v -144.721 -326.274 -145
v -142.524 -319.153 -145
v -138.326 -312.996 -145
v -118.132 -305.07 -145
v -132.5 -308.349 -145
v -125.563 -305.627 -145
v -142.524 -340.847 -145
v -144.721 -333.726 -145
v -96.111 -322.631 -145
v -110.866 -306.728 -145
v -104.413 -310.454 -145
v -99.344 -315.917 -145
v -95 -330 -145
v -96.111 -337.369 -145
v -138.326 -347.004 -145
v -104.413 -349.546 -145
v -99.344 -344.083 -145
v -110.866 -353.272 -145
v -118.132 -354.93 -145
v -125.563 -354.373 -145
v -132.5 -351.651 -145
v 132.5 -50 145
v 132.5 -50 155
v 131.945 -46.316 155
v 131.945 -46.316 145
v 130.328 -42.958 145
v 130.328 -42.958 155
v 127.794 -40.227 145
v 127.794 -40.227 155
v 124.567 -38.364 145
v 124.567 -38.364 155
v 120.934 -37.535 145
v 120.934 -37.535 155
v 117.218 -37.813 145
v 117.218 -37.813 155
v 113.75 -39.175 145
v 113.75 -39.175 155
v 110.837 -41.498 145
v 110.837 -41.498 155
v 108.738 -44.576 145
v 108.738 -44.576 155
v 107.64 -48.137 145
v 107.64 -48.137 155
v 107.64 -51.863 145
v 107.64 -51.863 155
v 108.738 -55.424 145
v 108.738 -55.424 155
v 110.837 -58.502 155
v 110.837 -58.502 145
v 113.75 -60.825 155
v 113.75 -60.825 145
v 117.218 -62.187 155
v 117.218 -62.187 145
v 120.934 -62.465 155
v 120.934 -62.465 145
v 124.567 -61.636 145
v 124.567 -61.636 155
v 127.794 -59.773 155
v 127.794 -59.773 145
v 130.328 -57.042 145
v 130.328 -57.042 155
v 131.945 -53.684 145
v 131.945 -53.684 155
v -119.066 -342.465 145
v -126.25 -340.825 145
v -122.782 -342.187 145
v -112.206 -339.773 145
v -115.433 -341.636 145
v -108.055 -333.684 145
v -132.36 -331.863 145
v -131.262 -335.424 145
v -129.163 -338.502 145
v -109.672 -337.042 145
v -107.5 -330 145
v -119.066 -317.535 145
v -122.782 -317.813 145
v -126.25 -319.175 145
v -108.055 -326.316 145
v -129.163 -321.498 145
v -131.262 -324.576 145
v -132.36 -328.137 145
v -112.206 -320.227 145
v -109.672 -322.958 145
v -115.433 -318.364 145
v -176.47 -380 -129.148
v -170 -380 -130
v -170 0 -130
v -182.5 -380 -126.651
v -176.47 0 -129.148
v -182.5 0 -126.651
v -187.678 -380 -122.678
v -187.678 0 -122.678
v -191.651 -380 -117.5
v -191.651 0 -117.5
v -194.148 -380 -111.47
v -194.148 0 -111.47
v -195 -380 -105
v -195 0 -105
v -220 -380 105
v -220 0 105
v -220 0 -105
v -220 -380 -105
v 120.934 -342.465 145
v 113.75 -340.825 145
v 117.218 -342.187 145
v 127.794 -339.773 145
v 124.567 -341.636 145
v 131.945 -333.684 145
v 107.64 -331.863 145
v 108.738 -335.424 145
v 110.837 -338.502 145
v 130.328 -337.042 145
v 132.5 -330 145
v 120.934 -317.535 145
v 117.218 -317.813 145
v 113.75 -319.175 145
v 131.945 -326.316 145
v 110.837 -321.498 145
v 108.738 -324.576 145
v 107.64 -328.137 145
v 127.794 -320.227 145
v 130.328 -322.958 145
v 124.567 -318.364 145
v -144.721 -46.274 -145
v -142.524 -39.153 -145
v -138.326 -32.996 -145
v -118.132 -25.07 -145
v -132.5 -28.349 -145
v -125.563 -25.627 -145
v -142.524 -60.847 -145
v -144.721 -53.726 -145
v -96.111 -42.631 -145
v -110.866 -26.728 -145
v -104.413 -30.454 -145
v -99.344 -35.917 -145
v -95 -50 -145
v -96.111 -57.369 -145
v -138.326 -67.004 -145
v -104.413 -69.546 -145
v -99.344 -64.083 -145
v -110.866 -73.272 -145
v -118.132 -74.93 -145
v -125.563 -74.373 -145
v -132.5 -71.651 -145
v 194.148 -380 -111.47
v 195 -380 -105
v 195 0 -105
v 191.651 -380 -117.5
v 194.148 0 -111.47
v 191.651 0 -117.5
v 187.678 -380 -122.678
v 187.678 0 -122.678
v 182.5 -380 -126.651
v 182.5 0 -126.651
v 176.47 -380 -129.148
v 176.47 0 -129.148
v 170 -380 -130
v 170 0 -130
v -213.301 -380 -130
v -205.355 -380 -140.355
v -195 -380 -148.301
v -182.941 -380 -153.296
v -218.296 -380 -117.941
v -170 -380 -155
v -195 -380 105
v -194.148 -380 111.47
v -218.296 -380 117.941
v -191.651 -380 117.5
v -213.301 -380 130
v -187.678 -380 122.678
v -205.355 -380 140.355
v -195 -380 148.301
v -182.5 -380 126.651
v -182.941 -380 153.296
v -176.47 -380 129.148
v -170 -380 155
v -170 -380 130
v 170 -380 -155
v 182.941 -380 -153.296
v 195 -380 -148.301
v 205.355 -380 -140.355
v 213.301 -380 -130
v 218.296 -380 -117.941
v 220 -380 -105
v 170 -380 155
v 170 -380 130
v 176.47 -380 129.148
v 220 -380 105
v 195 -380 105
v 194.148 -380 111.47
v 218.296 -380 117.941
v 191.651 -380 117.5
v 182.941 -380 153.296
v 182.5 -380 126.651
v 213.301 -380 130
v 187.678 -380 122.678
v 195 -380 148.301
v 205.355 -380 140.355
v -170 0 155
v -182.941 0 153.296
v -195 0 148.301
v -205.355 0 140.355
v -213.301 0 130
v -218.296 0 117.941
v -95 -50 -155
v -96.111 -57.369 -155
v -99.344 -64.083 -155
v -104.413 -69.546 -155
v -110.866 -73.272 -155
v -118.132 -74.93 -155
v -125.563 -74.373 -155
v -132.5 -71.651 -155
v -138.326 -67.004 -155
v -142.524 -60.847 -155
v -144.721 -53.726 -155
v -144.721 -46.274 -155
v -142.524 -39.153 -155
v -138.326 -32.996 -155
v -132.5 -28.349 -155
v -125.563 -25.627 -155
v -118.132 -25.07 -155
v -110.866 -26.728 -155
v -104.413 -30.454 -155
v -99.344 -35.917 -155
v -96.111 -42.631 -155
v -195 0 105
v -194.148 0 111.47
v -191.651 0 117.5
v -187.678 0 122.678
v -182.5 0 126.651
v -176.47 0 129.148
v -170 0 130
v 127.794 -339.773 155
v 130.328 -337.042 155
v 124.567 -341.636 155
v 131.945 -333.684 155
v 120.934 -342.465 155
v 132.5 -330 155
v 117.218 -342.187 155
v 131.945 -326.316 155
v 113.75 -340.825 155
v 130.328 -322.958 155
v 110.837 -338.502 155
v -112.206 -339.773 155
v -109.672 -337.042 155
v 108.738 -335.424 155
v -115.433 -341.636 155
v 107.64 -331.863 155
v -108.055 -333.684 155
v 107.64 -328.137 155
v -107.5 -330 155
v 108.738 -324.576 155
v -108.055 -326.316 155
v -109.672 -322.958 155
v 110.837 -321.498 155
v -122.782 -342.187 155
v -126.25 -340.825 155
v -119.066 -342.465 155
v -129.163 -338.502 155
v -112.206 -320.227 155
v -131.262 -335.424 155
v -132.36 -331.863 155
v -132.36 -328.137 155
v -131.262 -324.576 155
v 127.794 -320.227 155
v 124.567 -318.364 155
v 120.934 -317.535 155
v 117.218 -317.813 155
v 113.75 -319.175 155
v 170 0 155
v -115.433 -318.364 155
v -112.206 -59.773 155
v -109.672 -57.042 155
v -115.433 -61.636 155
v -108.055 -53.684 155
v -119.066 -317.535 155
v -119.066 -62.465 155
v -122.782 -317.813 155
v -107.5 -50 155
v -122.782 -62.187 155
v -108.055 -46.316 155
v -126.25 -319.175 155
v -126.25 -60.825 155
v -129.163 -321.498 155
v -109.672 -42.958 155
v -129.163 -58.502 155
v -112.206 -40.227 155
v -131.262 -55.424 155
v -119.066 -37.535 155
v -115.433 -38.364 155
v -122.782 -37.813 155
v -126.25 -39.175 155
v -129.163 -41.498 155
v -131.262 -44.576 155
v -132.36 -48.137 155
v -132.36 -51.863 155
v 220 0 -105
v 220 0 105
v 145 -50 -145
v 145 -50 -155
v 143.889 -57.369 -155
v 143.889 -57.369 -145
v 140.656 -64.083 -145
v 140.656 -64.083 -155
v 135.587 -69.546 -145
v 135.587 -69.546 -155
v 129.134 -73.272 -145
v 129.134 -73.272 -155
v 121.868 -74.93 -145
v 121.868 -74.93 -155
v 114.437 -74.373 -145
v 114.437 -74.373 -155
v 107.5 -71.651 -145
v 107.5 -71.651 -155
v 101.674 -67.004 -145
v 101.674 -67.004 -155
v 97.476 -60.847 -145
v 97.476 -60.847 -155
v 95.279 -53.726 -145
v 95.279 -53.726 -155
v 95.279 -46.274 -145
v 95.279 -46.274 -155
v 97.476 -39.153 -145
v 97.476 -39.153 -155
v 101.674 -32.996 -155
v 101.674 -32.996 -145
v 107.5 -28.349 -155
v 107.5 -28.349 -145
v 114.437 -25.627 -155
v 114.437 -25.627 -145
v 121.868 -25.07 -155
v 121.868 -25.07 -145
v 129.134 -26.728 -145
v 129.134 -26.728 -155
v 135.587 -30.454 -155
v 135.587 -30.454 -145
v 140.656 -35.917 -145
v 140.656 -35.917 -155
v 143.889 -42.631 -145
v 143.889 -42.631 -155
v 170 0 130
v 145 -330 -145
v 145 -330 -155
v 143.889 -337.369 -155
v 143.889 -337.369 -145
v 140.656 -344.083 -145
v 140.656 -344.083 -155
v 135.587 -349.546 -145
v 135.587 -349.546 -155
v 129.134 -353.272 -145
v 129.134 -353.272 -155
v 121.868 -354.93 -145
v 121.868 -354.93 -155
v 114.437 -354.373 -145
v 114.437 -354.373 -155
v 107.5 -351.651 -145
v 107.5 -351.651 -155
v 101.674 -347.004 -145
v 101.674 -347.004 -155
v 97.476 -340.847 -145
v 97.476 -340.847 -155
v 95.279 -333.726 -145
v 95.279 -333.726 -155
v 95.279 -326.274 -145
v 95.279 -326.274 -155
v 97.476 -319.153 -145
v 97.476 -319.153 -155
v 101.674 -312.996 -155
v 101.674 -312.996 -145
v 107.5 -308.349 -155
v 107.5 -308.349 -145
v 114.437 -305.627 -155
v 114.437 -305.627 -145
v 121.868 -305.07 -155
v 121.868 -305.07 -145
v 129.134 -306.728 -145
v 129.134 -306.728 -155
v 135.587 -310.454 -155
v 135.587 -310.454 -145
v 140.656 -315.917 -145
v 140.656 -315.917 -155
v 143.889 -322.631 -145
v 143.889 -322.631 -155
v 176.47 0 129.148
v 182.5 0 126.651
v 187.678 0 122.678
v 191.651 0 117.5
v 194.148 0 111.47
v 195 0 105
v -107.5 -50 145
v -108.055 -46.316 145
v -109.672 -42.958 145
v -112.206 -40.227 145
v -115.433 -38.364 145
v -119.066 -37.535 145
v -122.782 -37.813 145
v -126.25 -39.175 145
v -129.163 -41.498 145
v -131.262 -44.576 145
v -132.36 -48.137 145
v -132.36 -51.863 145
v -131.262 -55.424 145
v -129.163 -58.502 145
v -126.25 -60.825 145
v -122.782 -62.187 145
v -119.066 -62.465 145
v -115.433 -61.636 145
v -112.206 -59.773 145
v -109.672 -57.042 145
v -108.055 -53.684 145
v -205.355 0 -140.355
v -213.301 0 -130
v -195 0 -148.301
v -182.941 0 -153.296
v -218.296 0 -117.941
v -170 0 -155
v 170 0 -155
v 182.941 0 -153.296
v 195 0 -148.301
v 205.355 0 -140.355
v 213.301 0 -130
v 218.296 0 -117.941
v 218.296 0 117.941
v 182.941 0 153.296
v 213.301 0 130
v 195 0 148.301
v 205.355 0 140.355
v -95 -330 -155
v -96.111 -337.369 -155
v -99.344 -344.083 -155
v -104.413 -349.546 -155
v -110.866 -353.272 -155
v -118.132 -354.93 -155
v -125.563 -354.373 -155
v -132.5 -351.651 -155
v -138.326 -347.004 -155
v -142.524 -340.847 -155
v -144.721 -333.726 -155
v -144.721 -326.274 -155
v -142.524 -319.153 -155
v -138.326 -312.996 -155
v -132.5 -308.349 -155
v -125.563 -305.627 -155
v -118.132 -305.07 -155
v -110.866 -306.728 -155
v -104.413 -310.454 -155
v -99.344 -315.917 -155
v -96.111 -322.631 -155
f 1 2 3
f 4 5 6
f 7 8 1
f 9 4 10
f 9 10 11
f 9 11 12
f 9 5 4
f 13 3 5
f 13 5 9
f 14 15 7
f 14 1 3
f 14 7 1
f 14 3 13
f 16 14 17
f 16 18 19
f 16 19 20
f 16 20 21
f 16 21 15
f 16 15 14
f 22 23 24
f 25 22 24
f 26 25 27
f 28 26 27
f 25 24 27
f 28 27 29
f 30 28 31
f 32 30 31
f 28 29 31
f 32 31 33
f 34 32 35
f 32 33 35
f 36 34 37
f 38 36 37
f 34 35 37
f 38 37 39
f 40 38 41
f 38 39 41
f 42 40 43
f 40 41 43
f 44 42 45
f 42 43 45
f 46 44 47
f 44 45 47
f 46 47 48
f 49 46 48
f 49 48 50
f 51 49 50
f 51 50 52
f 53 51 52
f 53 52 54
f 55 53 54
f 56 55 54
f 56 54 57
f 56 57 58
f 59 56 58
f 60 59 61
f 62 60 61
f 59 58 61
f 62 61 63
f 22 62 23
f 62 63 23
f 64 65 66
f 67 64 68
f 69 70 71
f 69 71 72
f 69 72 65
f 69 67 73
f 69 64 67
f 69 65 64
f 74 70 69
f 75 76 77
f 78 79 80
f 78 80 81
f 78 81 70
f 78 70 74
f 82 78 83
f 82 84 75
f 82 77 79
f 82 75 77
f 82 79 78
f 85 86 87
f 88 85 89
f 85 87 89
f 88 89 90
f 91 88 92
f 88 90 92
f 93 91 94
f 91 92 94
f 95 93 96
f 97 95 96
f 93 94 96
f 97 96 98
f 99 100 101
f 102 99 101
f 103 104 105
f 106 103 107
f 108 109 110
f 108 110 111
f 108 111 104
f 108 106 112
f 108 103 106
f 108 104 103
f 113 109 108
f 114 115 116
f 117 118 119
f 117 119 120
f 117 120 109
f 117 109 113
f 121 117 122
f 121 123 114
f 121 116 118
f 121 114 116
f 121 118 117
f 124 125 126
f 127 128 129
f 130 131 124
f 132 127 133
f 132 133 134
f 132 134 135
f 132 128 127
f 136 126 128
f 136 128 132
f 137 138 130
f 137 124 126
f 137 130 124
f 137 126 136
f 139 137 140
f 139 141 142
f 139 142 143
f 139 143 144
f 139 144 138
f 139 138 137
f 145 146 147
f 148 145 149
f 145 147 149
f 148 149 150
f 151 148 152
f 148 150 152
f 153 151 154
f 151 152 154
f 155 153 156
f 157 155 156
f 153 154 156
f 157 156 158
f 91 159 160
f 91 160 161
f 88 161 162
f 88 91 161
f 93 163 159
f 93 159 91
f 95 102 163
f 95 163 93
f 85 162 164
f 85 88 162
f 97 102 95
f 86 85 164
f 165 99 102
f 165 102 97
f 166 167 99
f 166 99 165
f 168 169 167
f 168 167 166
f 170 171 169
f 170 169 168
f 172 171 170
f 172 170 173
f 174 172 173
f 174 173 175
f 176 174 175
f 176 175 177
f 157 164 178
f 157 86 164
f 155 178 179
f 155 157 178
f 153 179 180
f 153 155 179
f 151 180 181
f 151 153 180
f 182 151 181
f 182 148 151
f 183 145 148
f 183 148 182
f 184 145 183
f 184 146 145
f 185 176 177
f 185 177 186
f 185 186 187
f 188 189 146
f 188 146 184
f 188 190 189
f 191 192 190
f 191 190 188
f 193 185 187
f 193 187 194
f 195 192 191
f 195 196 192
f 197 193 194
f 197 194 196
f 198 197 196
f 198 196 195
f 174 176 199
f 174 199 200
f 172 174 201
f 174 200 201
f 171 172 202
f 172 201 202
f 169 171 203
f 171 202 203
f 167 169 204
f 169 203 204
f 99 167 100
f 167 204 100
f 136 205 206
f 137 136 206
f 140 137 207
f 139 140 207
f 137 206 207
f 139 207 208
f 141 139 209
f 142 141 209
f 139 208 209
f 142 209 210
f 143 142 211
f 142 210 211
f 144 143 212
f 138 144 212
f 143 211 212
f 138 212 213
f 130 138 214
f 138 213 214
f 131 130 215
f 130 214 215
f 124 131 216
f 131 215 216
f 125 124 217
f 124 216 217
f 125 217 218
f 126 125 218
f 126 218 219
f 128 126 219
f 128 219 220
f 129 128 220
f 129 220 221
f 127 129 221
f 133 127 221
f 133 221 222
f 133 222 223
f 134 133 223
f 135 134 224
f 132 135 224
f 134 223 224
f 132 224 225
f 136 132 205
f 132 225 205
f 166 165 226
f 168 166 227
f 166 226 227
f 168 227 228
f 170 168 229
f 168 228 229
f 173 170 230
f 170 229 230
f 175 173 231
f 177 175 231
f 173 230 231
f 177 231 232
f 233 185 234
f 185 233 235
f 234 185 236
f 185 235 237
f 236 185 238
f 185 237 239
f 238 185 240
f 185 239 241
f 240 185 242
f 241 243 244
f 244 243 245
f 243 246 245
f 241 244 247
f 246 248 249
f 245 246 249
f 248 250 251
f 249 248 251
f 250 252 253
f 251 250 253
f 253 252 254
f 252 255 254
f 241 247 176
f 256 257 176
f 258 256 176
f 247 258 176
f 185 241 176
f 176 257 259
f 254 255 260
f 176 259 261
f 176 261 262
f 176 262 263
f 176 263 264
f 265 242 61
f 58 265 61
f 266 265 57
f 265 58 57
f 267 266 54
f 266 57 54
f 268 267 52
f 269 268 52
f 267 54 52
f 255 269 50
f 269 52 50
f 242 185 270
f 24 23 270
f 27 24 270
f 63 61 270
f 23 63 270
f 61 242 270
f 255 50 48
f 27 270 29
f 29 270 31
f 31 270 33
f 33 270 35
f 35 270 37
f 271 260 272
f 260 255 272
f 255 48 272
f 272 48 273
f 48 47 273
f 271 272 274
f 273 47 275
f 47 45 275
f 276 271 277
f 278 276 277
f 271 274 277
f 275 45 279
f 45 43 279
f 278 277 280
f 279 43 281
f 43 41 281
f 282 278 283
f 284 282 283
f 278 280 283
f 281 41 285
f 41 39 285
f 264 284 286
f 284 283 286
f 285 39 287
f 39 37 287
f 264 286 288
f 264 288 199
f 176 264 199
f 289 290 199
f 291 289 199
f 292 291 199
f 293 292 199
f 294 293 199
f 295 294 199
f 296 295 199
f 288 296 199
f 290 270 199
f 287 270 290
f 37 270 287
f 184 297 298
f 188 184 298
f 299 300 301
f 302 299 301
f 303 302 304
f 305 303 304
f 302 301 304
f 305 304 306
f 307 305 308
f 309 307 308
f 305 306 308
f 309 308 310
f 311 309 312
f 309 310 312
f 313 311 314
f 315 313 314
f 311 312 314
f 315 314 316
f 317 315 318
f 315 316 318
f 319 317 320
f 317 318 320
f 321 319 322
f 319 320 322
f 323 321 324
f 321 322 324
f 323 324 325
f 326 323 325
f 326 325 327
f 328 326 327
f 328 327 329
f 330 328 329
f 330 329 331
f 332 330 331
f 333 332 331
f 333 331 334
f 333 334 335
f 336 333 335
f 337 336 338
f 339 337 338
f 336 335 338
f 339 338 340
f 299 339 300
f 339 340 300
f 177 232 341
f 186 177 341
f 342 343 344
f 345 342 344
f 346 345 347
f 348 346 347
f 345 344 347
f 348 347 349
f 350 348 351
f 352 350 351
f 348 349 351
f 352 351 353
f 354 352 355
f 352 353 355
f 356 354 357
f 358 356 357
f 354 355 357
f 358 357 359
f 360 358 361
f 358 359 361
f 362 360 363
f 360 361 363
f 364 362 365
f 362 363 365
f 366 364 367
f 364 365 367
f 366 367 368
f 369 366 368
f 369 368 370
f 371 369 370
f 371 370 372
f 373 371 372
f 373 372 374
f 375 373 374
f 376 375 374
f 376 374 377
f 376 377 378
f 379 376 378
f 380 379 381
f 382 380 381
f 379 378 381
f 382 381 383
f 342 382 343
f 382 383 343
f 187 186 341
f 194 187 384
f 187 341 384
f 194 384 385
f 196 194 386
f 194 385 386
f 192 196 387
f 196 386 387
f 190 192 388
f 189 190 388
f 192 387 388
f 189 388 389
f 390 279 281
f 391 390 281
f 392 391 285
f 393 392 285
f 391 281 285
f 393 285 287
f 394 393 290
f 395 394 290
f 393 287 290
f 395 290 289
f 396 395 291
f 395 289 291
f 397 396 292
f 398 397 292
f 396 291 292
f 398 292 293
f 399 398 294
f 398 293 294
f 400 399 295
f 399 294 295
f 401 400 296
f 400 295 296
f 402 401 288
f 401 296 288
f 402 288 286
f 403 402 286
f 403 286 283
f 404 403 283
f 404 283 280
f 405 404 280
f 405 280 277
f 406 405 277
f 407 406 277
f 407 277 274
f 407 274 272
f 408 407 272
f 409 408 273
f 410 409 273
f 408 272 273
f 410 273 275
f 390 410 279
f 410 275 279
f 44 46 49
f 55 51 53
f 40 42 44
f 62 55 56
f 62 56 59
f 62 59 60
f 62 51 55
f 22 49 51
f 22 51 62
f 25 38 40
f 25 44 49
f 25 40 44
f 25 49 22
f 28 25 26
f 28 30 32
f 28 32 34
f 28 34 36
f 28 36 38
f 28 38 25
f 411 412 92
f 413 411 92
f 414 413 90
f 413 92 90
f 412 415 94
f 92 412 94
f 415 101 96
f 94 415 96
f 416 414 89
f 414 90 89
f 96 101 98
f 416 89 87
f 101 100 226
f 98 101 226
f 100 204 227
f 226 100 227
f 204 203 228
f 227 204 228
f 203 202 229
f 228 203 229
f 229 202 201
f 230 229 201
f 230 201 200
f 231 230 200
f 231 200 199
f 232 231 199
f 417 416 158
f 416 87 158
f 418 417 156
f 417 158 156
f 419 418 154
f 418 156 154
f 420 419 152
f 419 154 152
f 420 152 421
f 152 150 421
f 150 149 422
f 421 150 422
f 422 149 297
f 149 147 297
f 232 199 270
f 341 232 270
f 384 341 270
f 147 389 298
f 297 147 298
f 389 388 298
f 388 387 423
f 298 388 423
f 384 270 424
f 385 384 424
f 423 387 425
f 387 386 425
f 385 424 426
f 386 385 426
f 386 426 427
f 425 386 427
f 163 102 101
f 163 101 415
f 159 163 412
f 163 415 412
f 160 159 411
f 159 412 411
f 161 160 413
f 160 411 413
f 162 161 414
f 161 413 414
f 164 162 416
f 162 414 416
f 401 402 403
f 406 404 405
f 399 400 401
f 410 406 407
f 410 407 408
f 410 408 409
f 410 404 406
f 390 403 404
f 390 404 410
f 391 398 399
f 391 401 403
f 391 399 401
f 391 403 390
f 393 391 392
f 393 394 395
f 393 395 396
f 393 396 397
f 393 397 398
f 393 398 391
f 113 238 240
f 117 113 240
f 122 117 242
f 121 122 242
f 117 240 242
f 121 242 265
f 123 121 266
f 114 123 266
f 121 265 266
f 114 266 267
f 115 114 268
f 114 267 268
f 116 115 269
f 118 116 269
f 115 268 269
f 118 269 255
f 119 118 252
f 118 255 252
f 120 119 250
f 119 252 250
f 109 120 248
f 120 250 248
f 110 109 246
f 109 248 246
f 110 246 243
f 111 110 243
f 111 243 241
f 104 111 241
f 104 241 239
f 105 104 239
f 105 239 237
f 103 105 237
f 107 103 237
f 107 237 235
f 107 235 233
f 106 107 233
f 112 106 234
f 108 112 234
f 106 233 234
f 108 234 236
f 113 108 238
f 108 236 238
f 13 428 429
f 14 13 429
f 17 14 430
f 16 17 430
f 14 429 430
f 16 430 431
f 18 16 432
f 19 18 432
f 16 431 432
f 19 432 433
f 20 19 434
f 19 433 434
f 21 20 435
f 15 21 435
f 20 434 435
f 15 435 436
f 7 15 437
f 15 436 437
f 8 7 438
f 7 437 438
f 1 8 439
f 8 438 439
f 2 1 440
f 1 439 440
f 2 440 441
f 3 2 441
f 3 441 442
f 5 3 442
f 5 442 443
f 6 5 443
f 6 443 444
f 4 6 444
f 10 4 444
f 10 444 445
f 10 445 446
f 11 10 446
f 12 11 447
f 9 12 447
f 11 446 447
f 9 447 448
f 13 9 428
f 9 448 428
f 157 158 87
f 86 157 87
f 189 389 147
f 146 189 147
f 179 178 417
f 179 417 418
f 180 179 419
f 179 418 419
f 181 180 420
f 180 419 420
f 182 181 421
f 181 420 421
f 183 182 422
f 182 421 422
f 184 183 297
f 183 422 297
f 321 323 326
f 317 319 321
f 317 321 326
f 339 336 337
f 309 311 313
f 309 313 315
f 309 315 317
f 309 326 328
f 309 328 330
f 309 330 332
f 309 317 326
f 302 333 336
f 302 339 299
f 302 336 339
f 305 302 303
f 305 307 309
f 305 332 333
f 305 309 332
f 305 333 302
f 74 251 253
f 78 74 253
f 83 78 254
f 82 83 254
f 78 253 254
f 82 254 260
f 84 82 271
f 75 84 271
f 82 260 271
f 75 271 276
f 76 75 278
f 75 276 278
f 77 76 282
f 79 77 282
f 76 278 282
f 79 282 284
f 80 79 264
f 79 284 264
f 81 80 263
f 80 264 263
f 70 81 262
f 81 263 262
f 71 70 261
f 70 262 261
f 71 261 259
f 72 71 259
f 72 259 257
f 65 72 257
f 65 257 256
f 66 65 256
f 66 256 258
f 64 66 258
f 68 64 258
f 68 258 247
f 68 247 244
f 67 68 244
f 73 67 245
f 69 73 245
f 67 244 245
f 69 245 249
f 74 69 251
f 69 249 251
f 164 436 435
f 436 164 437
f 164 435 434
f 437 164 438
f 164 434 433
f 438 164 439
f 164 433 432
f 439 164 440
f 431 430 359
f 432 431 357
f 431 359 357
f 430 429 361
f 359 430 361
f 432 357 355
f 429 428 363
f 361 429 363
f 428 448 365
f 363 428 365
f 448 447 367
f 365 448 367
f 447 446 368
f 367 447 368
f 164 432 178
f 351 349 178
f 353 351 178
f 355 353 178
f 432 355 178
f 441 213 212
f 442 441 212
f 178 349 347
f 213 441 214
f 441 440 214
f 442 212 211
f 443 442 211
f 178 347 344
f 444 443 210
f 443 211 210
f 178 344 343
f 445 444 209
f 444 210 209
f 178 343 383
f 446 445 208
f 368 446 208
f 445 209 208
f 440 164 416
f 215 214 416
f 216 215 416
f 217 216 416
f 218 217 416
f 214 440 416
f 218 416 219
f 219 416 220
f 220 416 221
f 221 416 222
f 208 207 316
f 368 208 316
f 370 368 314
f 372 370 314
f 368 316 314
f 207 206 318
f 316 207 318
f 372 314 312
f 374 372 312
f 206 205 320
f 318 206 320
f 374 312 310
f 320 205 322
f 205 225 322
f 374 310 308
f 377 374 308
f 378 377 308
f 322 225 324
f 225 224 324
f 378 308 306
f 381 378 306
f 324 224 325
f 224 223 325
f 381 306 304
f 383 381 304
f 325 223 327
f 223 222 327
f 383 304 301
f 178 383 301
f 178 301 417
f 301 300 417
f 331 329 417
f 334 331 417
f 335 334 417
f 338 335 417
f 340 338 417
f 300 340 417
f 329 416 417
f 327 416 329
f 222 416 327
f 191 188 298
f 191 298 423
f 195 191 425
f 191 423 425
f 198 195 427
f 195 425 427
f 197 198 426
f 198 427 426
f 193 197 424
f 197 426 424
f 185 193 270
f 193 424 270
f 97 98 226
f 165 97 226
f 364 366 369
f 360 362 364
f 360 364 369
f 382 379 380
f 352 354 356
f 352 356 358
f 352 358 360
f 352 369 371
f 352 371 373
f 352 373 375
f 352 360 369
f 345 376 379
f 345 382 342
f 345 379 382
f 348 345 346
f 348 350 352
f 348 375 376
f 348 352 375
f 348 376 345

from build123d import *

# Parameters (mm, degrees)
F1_DEPTH = 380
F2_R     = 25
F3_DEPTH = 10
F4_R     = 12.5
F5_DEPTH = 10


with BuildPart() as f1:
    # F0 (on Front) → F1 (new body)
    with BuildSketch(Plane.XZ):
        with BuildLine():
            ThreePointArc((-220, -105), (-205.355339, -140.355339), (-170, -155))
            Line((-170, -155), (170, -155))
            ThreePointArc((170, -155), (205.355339, -140.355339), (220, -105))
            Line((220, -105), (220, 105))
            ThreePointArc((220, 105), (205.355339, 140.355339), (170, 155))
            Line((170, 155), (-170, 155))
            ThreePointArc((-170, 155), (-205.355339, 140.355339), (-220, 105))
            Line((-220, 105), (-220, -105))
        make_face()
        with BuildLine():
            ThreePointArc((195, -105), (187.67767, -122.67767), (170, -130))
            Line((170, -130), (-170, -130))
            ThreePointArc((-170, -130), (-187.67767, -122.67767), (-195, -105))
            Line((-195, -105), (-195, 105))
            ThreePointArc((-195, 105), (-187.67767, 122.67767), (-170, 130))
            Line((-170, 130), (170, 130))
            ThreePointArc((170, 130), (187.67767, 122.67767), (195, 105))
            Line((195, 105), (195, -105))
        make_face(mode=Mode.SUBTRACT)
    extrude(amount=F1_DEPTH)

    # F2 (on face) → F3 (cut)
    with BuildSketch(Plane(origin=(0, 0, -155), x_dir=(1, 0, 0), z_dir=(0, 0, -1))):
        with Locations((-120, 50)):
            Circle(F2_R)
        with Locations((-120, 330)):
            Circle(F2_R)
        with Locations((120, 50)):
            Circle(F2_R)
        with Locations((120, 330)):
            Circle(F2_R)
    extrude(amount=-F3_DEPTH, mode=Mode.SUBTRACT)

    # F4 (on face) → F5 (cut)
    with BuildSketch(Plane.XY.offset(155)):
        with Locations((-120, -50)):
            Circle(F4_R)
        with Locations((-120, -330)):
            Circle(F4_R)
        with Locations((120, -330)):
            Circle(F4_R)
        with Locations((120, -50)):
            Circle(F4_R)
    extrude(amount=-F5_DEPTH, mode=Mode.SUBTRACT)


solid = f1.part
